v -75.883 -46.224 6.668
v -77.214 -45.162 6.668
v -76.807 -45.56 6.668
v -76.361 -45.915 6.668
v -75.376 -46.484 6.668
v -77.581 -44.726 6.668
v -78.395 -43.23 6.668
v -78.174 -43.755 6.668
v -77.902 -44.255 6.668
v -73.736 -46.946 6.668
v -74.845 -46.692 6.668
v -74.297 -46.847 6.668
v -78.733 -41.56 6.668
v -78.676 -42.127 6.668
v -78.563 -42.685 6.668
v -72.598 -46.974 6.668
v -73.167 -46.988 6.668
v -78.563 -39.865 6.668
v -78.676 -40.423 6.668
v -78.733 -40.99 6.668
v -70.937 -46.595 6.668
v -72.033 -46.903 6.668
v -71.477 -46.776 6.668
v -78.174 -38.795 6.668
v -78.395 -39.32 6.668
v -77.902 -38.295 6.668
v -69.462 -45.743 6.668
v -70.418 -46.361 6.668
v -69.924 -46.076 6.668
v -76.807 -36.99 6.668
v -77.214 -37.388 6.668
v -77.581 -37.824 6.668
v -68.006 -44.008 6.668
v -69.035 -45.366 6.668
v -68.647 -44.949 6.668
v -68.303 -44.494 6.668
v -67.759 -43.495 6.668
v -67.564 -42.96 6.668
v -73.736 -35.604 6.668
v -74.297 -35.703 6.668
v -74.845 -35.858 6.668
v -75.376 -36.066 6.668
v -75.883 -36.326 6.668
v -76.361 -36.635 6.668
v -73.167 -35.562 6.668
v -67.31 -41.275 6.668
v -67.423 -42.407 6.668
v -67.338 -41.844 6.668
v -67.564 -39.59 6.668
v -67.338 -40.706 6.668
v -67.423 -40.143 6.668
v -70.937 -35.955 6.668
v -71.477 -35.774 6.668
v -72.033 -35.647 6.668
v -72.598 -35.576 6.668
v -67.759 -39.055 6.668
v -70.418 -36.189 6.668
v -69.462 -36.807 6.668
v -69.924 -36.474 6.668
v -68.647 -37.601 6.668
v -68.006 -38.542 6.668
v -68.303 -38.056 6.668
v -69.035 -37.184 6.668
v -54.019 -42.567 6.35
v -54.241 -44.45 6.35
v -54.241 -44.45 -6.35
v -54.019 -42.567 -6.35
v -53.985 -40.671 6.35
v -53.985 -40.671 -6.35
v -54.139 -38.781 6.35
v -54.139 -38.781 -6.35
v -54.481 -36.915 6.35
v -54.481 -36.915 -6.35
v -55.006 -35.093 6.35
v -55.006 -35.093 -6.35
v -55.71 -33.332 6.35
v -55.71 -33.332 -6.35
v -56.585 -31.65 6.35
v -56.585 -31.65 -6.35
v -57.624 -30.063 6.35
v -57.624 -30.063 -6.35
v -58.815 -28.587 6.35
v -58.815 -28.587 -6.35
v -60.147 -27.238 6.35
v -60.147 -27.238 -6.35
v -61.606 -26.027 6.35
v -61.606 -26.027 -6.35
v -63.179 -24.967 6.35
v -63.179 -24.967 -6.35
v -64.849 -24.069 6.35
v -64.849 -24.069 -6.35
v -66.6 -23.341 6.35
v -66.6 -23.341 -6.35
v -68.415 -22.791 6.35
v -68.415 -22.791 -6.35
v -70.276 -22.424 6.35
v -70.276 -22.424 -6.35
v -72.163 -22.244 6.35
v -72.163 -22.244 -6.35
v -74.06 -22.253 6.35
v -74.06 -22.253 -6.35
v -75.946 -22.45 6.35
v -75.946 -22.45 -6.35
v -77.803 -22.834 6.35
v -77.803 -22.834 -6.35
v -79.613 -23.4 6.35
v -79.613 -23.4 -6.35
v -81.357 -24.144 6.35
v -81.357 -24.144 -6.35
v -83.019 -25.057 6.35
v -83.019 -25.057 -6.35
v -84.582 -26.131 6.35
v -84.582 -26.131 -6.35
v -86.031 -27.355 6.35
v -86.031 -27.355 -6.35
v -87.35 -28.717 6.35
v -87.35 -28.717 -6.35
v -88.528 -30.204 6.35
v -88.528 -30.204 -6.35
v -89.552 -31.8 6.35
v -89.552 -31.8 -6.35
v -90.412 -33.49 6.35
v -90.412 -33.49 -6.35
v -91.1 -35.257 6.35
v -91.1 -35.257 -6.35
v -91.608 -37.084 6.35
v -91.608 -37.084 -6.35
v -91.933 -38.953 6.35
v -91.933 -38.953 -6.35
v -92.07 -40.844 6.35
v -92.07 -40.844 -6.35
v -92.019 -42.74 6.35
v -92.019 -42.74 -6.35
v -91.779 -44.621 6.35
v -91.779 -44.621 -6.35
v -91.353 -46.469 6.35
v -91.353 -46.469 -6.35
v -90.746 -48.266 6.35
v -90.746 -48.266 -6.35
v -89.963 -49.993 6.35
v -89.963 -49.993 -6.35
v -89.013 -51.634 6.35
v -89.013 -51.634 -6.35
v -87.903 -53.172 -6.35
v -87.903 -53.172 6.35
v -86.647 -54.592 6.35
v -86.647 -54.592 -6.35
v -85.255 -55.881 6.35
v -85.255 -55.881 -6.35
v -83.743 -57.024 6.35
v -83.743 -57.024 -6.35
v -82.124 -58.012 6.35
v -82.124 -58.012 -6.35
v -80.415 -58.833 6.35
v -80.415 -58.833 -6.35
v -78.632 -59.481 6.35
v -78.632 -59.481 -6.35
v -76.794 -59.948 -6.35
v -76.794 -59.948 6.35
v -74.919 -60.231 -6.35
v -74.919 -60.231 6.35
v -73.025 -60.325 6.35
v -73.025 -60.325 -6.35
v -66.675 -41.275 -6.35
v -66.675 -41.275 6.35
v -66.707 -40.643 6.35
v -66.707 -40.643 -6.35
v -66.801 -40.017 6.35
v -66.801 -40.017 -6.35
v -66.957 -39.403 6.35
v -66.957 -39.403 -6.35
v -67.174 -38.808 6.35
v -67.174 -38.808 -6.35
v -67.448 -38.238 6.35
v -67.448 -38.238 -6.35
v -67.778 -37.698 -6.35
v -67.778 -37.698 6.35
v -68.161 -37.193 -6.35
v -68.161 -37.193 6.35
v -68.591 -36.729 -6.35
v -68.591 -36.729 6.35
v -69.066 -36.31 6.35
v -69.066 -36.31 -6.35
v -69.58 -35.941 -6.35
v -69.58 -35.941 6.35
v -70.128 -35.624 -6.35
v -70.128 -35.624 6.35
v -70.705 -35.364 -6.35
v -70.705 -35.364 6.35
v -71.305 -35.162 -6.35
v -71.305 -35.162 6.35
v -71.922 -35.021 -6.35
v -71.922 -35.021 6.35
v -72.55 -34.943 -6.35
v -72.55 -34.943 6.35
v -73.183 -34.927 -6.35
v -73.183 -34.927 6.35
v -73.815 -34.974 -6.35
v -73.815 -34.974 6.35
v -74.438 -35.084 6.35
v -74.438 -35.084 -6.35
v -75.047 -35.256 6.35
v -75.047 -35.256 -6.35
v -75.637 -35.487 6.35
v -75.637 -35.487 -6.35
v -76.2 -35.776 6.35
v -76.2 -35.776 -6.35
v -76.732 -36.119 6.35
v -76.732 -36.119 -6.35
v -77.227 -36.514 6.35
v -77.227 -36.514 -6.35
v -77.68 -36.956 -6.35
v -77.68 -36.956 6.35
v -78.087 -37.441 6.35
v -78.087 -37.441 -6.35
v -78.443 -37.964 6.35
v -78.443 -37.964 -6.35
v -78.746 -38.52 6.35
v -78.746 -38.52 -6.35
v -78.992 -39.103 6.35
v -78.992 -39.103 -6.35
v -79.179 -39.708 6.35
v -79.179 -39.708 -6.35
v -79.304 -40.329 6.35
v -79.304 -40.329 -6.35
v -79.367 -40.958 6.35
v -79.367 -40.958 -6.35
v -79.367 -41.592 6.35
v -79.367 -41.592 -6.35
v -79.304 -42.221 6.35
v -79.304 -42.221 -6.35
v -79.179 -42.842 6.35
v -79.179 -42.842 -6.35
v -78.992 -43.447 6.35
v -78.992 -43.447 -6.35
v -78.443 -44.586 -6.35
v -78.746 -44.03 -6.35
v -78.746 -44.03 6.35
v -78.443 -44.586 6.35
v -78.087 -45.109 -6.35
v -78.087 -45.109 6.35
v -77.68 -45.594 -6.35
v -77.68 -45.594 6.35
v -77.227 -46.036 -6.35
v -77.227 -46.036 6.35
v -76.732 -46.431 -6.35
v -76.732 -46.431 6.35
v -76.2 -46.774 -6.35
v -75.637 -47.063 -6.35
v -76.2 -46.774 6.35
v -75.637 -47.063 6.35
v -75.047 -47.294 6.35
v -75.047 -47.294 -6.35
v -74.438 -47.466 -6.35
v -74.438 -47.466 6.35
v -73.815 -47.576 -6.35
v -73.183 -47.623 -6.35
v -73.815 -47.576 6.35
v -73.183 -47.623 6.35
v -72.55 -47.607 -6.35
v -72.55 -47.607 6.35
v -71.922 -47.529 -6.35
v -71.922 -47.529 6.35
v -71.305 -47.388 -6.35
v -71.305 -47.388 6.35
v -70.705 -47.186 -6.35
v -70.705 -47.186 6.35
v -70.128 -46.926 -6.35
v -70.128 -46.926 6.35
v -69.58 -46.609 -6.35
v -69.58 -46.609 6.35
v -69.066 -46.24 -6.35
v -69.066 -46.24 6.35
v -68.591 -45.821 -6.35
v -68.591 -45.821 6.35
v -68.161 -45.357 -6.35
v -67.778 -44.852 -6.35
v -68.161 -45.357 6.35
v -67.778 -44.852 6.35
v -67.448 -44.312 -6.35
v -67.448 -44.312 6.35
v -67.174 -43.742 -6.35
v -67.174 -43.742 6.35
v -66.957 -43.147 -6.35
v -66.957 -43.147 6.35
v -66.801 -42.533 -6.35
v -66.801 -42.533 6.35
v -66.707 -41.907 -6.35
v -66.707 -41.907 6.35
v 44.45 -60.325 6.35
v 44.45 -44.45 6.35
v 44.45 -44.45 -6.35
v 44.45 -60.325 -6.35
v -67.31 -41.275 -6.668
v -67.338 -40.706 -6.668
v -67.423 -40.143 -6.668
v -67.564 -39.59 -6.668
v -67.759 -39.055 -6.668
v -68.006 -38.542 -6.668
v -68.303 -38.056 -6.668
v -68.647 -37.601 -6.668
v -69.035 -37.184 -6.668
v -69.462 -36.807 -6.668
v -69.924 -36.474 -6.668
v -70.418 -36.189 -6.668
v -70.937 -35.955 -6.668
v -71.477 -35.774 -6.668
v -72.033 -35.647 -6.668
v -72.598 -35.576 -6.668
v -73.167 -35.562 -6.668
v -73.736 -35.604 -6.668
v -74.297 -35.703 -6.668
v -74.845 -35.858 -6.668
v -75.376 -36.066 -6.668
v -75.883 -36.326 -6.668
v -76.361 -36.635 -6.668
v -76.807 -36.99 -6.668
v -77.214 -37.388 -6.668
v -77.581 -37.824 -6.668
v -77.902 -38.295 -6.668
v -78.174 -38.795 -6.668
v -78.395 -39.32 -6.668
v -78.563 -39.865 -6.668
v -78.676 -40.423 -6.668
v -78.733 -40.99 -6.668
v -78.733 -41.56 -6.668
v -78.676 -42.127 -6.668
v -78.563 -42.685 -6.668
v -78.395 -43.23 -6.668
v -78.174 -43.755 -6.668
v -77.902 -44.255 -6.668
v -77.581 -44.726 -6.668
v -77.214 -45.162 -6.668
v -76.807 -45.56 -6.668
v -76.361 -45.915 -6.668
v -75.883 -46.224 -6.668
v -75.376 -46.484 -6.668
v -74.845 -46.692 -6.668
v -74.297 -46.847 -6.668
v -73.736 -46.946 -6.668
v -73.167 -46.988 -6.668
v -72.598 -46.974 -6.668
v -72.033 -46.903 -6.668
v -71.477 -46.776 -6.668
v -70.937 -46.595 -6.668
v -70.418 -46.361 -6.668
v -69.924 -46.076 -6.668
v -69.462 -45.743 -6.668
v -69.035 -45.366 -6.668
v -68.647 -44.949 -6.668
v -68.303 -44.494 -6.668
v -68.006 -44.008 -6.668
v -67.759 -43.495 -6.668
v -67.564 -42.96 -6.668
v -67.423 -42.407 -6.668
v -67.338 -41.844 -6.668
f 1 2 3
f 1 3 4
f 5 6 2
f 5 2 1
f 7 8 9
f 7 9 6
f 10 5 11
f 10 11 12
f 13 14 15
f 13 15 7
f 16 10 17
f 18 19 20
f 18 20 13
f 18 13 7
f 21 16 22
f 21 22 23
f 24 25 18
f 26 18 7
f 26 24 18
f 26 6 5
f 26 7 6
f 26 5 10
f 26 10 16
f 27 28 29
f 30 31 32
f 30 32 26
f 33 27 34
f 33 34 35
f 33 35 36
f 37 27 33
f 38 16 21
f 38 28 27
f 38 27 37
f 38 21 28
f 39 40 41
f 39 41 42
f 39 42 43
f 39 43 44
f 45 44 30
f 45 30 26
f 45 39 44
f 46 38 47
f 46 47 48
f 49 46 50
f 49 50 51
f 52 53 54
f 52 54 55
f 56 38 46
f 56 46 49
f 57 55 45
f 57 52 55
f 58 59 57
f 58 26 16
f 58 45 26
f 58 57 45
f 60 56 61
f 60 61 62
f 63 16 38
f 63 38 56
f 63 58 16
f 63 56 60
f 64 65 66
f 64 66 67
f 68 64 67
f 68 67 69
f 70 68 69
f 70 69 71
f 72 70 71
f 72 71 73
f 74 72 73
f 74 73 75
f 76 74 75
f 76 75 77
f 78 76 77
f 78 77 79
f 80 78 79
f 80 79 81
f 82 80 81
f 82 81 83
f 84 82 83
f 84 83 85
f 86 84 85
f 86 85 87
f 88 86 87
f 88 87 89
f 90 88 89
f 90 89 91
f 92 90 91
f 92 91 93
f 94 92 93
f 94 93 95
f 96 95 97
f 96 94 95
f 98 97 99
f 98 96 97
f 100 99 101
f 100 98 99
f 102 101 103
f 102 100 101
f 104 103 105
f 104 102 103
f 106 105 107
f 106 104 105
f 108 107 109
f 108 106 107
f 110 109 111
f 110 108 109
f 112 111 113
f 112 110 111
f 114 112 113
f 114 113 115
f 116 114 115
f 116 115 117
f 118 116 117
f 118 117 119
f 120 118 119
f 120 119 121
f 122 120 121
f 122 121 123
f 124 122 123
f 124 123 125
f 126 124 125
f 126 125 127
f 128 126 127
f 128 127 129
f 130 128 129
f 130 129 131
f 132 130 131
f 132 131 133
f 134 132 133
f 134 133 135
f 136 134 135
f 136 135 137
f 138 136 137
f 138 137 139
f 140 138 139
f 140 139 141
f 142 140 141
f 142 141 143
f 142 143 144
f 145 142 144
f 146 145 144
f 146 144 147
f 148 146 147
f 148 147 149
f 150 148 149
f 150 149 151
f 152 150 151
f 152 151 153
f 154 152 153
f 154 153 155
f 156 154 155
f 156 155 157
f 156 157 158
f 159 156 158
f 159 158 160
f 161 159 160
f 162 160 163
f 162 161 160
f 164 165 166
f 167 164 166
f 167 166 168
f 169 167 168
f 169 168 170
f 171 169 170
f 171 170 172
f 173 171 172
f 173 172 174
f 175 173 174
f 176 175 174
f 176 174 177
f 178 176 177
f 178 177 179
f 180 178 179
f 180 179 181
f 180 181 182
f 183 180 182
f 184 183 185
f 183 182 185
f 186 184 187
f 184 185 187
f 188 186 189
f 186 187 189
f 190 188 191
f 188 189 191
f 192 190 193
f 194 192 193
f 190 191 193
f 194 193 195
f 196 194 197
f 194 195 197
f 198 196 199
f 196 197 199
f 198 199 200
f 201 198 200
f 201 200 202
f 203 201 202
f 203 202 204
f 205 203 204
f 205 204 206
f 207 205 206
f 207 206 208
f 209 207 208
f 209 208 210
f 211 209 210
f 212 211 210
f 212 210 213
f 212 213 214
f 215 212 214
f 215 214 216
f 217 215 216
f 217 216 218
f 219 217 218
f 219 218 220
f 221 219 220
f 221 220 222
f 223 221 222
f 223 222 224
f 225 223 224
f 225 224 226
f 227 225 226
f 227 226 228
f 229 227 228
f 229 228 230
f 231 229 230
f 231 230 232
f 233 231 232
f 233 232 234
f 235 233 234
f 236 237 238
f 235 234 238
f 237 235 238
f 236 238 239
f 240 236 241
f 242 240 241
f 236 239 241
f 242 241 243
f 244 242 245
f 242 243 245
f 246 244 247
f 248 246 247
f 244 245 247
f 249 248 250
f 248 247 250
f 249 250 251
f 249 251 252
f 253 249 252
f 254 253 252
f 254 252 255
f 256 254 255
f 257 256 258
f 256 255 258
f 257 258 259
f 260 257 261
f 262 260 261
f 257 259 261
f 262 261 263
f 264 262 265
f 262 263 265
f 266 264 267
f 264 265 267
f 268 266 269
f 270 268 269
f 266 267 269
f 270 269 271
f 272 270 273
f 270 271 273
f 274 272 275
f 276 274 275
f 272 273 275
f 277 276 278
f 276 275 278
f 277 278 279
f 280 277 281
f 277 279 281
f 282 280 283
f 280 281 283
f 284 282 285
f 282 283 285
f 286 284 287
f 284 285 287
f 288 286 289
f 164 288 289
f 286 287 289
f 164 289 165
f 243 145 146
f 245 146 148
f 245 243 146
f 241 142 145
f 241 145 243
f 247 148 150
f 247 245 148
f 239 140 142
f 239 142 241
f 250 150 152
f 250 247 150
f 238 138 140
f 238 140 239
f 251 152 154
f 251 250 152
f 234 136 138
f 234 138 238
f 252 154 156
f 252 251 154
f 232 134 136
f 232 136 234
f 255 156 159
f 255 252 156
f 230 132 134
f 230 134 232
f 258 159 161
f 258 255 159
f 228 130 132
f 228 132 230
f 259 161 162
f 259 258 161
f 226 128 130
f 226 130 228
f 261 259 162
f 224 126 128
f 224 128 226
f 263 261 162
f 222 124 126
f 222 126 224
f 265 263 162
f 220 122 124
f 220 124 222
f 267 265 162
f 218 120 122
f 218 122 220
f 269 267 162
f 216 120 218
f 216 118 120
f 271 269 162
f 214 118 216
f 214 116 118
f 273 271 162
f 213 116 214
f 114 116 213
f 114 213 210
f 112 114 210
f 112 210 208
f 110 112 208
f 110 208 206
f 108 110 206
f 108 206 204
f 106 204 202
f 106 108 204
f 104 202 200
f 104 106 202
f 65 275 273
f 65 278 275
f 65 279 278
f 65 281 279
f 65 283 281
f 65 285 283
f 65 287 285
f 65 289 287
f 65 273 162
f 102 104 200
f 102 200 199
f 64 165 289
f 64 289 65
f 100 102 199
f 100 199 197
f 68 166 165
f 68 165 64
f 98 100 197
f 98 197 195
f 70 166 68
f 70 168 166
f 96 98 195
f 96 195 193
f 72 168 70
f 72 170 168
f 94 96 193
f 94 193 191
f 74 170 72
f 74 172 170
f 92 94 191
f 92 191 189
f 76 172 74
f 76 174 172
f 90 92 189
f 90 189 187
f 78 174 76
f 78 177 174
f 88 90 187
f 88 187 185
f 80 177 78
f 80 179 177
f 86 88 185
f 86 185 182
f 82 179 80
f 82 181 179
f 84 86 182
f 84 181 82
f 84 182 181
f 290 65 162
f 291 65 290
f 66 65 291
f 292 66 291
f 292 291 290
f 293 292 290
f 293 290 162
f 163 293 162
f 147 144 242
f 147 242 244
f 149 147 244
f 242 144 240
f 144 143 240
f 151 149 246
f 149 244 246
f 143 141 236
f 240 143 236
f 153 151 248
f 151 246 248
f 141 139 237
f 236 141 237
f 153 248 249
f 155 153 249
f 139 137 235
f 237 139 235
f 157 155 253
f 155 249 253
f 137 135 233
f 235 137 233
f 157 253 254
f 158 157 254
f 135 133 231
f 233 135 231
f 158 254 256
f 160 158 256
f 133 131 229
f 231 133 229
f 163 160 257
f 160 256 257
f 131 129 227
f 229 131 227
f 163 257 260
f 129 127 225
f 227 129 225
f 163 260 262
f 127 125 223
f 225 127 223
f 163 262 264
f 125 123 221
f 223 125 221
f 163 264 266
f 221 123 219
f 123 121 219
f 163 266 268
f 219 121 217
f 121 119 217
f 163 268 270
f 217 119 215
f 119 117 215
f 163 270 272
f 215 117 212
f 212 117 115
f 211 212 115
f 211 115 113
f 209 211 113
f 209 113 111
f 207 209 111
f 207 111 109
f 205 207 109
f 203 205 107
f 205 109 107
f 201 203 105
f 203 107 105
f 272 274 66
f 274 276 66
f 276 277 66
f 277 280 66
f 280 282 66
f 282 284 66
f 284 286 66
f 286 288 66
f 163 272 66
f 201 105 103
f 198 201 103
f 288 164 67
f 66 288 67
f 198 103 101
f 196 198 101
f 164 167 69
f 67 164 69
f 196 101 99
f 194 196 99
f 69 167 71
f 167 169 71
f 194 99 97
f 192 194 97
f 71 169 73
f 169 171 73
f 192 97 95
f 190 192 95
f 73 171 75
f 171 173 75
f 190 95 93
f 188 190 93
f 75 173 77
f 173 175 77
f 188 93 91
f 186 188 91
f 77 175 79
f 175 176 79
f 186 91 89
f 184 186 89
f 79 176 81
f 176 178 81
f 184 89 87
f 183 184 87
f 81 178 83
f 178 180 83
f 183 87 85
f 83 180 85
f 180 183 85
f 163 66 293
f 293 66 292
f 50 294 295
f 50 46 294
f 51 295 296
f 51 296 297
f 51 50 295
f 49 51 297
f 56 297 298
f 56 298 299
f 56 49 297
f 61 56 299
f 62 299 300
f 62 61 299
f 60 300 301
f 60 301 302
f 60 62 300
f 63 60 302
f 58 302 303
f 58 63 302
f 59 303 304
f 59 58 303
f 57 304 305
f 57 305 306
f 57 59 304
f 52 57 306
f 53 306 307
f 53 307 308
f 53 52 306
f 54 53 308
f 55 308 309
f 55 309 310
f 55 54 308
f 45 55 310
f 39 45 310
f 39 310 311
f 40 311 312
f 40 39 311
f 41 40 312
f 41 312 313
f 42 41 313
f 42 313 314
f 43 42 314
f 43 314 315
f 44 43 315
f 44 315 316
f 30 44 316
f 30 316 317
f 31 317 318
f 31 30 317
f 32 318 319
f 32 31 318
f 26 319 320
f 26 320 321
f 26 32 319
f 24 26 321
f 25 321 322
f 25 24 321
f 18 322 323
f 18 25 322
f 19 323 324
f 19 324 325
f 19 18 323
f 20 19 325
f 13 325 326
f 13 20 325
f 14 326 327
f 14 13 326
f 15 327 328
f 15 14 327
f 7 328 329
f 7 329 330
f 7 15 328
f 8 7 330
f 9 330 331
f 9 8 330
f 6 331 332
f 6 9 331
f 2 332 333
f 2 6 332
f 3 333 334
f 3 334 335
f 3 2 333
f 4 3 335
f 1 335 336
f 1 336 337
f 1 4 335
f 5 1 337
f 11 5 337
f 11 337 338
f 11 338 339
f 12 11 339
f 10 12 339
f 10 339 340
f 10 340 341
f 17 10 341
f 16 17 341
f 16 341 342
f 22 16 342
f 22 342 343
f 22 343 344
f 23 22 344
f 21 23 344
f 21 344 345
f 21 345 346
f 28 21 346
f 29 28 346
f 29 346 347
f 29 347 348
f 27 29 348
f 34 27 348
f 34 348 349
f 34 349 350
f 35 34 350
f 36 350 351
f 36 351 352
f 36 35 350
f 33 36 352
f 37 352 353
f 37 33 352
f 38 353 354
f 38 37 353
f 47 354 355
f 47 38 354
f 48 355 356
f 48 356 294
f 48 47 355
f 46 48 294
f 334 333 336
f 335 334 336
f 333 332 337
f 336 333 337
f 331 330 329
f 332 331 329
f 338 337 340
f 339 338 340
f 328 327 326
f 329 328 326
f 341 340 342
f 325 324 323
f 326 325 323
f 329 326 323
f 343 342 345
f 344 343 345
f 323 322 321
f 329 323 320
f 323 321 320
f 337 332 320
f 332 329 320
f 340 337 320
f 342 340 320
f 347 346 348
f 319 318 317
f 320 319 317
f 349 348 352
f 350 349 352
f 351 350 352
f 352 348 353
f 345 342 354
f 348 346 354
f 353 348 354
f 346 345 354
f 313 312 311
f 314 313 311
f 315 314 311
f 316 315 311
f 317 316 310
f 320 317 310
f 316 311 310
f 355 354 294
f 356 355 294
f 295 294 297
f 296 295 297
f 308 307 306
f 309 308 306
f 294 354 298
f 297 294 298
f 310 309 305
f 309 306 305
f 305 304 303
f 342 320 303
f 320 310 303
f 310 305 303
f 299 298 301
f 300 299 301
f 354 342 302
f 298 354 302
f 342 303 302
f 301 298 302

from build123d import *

# Parameters (mm, degrees)
SKETCH1_R           = 19.05
BOSS_EXTRUDE1_DEPTH = 6.35
BOSS_EXTRUDE2_DEPTH = 12.7
SKETCH3_R           = 6.35
CUT_EXTRUDE1_DEPTH  = 111.807045128
SKETCH4_R           = 5.715
BOSS_EXTRUDE3_DEPTH = 6.6675


with BuildPart() as part:
    # Sketch1 → Boss-Extrude1 (new, symmetric)
    with BuildSketch(Plane.XY):
        with Locations((-73.025, -41.275)):
            Circle(SKETCH1_R)
    extrude(amount=BOSS_EXTRUDE1_DEPTH, both=True)

    # Sketch2 → Boss-Extrude2 (add)
    with BuildSketch(Plane.XY.offset(6.35)):
        with BuildLine():
            Line((-54.241446689, -44.45), (44.45, -44.45))
            Line((44.45, -44.45), (44.45, -60.325))
            Line((44.45, -60.325), (-73.025, -60.325))
            ThreePointArc((-73.025, -60.325), (-60.728277876, -55.824677831), (-54.241446689, -44.45))
        make_face()
    extrude(amount=-BOSS_EXTRUDE2_DEPTH)

    # Sketch3 → Cut-Extrude1 (cut, through all)
    with BuildSketch(Plane.XY.offset(6.35)):
        with Locations((-73.025, -41.275)):
            Circle(SKETCH3_R)
    extrude(amount=-CUT_EXTRUDE1_DEPTH, mode=Mode.SUBTRACT)


with BuildPart() as body_2:
    # Sketch4 → Boss-Extrude3 (new, symmetric)
    with BuildSketch(Plane.XY):
        with Locations((-73.025, -41.275)):
            Circle(SKETCH4_R)
    extrude(amount=BOSS_EXTRUDE3_DEPTH, both=True)


solid = Compound([part.part, body_2.part])
